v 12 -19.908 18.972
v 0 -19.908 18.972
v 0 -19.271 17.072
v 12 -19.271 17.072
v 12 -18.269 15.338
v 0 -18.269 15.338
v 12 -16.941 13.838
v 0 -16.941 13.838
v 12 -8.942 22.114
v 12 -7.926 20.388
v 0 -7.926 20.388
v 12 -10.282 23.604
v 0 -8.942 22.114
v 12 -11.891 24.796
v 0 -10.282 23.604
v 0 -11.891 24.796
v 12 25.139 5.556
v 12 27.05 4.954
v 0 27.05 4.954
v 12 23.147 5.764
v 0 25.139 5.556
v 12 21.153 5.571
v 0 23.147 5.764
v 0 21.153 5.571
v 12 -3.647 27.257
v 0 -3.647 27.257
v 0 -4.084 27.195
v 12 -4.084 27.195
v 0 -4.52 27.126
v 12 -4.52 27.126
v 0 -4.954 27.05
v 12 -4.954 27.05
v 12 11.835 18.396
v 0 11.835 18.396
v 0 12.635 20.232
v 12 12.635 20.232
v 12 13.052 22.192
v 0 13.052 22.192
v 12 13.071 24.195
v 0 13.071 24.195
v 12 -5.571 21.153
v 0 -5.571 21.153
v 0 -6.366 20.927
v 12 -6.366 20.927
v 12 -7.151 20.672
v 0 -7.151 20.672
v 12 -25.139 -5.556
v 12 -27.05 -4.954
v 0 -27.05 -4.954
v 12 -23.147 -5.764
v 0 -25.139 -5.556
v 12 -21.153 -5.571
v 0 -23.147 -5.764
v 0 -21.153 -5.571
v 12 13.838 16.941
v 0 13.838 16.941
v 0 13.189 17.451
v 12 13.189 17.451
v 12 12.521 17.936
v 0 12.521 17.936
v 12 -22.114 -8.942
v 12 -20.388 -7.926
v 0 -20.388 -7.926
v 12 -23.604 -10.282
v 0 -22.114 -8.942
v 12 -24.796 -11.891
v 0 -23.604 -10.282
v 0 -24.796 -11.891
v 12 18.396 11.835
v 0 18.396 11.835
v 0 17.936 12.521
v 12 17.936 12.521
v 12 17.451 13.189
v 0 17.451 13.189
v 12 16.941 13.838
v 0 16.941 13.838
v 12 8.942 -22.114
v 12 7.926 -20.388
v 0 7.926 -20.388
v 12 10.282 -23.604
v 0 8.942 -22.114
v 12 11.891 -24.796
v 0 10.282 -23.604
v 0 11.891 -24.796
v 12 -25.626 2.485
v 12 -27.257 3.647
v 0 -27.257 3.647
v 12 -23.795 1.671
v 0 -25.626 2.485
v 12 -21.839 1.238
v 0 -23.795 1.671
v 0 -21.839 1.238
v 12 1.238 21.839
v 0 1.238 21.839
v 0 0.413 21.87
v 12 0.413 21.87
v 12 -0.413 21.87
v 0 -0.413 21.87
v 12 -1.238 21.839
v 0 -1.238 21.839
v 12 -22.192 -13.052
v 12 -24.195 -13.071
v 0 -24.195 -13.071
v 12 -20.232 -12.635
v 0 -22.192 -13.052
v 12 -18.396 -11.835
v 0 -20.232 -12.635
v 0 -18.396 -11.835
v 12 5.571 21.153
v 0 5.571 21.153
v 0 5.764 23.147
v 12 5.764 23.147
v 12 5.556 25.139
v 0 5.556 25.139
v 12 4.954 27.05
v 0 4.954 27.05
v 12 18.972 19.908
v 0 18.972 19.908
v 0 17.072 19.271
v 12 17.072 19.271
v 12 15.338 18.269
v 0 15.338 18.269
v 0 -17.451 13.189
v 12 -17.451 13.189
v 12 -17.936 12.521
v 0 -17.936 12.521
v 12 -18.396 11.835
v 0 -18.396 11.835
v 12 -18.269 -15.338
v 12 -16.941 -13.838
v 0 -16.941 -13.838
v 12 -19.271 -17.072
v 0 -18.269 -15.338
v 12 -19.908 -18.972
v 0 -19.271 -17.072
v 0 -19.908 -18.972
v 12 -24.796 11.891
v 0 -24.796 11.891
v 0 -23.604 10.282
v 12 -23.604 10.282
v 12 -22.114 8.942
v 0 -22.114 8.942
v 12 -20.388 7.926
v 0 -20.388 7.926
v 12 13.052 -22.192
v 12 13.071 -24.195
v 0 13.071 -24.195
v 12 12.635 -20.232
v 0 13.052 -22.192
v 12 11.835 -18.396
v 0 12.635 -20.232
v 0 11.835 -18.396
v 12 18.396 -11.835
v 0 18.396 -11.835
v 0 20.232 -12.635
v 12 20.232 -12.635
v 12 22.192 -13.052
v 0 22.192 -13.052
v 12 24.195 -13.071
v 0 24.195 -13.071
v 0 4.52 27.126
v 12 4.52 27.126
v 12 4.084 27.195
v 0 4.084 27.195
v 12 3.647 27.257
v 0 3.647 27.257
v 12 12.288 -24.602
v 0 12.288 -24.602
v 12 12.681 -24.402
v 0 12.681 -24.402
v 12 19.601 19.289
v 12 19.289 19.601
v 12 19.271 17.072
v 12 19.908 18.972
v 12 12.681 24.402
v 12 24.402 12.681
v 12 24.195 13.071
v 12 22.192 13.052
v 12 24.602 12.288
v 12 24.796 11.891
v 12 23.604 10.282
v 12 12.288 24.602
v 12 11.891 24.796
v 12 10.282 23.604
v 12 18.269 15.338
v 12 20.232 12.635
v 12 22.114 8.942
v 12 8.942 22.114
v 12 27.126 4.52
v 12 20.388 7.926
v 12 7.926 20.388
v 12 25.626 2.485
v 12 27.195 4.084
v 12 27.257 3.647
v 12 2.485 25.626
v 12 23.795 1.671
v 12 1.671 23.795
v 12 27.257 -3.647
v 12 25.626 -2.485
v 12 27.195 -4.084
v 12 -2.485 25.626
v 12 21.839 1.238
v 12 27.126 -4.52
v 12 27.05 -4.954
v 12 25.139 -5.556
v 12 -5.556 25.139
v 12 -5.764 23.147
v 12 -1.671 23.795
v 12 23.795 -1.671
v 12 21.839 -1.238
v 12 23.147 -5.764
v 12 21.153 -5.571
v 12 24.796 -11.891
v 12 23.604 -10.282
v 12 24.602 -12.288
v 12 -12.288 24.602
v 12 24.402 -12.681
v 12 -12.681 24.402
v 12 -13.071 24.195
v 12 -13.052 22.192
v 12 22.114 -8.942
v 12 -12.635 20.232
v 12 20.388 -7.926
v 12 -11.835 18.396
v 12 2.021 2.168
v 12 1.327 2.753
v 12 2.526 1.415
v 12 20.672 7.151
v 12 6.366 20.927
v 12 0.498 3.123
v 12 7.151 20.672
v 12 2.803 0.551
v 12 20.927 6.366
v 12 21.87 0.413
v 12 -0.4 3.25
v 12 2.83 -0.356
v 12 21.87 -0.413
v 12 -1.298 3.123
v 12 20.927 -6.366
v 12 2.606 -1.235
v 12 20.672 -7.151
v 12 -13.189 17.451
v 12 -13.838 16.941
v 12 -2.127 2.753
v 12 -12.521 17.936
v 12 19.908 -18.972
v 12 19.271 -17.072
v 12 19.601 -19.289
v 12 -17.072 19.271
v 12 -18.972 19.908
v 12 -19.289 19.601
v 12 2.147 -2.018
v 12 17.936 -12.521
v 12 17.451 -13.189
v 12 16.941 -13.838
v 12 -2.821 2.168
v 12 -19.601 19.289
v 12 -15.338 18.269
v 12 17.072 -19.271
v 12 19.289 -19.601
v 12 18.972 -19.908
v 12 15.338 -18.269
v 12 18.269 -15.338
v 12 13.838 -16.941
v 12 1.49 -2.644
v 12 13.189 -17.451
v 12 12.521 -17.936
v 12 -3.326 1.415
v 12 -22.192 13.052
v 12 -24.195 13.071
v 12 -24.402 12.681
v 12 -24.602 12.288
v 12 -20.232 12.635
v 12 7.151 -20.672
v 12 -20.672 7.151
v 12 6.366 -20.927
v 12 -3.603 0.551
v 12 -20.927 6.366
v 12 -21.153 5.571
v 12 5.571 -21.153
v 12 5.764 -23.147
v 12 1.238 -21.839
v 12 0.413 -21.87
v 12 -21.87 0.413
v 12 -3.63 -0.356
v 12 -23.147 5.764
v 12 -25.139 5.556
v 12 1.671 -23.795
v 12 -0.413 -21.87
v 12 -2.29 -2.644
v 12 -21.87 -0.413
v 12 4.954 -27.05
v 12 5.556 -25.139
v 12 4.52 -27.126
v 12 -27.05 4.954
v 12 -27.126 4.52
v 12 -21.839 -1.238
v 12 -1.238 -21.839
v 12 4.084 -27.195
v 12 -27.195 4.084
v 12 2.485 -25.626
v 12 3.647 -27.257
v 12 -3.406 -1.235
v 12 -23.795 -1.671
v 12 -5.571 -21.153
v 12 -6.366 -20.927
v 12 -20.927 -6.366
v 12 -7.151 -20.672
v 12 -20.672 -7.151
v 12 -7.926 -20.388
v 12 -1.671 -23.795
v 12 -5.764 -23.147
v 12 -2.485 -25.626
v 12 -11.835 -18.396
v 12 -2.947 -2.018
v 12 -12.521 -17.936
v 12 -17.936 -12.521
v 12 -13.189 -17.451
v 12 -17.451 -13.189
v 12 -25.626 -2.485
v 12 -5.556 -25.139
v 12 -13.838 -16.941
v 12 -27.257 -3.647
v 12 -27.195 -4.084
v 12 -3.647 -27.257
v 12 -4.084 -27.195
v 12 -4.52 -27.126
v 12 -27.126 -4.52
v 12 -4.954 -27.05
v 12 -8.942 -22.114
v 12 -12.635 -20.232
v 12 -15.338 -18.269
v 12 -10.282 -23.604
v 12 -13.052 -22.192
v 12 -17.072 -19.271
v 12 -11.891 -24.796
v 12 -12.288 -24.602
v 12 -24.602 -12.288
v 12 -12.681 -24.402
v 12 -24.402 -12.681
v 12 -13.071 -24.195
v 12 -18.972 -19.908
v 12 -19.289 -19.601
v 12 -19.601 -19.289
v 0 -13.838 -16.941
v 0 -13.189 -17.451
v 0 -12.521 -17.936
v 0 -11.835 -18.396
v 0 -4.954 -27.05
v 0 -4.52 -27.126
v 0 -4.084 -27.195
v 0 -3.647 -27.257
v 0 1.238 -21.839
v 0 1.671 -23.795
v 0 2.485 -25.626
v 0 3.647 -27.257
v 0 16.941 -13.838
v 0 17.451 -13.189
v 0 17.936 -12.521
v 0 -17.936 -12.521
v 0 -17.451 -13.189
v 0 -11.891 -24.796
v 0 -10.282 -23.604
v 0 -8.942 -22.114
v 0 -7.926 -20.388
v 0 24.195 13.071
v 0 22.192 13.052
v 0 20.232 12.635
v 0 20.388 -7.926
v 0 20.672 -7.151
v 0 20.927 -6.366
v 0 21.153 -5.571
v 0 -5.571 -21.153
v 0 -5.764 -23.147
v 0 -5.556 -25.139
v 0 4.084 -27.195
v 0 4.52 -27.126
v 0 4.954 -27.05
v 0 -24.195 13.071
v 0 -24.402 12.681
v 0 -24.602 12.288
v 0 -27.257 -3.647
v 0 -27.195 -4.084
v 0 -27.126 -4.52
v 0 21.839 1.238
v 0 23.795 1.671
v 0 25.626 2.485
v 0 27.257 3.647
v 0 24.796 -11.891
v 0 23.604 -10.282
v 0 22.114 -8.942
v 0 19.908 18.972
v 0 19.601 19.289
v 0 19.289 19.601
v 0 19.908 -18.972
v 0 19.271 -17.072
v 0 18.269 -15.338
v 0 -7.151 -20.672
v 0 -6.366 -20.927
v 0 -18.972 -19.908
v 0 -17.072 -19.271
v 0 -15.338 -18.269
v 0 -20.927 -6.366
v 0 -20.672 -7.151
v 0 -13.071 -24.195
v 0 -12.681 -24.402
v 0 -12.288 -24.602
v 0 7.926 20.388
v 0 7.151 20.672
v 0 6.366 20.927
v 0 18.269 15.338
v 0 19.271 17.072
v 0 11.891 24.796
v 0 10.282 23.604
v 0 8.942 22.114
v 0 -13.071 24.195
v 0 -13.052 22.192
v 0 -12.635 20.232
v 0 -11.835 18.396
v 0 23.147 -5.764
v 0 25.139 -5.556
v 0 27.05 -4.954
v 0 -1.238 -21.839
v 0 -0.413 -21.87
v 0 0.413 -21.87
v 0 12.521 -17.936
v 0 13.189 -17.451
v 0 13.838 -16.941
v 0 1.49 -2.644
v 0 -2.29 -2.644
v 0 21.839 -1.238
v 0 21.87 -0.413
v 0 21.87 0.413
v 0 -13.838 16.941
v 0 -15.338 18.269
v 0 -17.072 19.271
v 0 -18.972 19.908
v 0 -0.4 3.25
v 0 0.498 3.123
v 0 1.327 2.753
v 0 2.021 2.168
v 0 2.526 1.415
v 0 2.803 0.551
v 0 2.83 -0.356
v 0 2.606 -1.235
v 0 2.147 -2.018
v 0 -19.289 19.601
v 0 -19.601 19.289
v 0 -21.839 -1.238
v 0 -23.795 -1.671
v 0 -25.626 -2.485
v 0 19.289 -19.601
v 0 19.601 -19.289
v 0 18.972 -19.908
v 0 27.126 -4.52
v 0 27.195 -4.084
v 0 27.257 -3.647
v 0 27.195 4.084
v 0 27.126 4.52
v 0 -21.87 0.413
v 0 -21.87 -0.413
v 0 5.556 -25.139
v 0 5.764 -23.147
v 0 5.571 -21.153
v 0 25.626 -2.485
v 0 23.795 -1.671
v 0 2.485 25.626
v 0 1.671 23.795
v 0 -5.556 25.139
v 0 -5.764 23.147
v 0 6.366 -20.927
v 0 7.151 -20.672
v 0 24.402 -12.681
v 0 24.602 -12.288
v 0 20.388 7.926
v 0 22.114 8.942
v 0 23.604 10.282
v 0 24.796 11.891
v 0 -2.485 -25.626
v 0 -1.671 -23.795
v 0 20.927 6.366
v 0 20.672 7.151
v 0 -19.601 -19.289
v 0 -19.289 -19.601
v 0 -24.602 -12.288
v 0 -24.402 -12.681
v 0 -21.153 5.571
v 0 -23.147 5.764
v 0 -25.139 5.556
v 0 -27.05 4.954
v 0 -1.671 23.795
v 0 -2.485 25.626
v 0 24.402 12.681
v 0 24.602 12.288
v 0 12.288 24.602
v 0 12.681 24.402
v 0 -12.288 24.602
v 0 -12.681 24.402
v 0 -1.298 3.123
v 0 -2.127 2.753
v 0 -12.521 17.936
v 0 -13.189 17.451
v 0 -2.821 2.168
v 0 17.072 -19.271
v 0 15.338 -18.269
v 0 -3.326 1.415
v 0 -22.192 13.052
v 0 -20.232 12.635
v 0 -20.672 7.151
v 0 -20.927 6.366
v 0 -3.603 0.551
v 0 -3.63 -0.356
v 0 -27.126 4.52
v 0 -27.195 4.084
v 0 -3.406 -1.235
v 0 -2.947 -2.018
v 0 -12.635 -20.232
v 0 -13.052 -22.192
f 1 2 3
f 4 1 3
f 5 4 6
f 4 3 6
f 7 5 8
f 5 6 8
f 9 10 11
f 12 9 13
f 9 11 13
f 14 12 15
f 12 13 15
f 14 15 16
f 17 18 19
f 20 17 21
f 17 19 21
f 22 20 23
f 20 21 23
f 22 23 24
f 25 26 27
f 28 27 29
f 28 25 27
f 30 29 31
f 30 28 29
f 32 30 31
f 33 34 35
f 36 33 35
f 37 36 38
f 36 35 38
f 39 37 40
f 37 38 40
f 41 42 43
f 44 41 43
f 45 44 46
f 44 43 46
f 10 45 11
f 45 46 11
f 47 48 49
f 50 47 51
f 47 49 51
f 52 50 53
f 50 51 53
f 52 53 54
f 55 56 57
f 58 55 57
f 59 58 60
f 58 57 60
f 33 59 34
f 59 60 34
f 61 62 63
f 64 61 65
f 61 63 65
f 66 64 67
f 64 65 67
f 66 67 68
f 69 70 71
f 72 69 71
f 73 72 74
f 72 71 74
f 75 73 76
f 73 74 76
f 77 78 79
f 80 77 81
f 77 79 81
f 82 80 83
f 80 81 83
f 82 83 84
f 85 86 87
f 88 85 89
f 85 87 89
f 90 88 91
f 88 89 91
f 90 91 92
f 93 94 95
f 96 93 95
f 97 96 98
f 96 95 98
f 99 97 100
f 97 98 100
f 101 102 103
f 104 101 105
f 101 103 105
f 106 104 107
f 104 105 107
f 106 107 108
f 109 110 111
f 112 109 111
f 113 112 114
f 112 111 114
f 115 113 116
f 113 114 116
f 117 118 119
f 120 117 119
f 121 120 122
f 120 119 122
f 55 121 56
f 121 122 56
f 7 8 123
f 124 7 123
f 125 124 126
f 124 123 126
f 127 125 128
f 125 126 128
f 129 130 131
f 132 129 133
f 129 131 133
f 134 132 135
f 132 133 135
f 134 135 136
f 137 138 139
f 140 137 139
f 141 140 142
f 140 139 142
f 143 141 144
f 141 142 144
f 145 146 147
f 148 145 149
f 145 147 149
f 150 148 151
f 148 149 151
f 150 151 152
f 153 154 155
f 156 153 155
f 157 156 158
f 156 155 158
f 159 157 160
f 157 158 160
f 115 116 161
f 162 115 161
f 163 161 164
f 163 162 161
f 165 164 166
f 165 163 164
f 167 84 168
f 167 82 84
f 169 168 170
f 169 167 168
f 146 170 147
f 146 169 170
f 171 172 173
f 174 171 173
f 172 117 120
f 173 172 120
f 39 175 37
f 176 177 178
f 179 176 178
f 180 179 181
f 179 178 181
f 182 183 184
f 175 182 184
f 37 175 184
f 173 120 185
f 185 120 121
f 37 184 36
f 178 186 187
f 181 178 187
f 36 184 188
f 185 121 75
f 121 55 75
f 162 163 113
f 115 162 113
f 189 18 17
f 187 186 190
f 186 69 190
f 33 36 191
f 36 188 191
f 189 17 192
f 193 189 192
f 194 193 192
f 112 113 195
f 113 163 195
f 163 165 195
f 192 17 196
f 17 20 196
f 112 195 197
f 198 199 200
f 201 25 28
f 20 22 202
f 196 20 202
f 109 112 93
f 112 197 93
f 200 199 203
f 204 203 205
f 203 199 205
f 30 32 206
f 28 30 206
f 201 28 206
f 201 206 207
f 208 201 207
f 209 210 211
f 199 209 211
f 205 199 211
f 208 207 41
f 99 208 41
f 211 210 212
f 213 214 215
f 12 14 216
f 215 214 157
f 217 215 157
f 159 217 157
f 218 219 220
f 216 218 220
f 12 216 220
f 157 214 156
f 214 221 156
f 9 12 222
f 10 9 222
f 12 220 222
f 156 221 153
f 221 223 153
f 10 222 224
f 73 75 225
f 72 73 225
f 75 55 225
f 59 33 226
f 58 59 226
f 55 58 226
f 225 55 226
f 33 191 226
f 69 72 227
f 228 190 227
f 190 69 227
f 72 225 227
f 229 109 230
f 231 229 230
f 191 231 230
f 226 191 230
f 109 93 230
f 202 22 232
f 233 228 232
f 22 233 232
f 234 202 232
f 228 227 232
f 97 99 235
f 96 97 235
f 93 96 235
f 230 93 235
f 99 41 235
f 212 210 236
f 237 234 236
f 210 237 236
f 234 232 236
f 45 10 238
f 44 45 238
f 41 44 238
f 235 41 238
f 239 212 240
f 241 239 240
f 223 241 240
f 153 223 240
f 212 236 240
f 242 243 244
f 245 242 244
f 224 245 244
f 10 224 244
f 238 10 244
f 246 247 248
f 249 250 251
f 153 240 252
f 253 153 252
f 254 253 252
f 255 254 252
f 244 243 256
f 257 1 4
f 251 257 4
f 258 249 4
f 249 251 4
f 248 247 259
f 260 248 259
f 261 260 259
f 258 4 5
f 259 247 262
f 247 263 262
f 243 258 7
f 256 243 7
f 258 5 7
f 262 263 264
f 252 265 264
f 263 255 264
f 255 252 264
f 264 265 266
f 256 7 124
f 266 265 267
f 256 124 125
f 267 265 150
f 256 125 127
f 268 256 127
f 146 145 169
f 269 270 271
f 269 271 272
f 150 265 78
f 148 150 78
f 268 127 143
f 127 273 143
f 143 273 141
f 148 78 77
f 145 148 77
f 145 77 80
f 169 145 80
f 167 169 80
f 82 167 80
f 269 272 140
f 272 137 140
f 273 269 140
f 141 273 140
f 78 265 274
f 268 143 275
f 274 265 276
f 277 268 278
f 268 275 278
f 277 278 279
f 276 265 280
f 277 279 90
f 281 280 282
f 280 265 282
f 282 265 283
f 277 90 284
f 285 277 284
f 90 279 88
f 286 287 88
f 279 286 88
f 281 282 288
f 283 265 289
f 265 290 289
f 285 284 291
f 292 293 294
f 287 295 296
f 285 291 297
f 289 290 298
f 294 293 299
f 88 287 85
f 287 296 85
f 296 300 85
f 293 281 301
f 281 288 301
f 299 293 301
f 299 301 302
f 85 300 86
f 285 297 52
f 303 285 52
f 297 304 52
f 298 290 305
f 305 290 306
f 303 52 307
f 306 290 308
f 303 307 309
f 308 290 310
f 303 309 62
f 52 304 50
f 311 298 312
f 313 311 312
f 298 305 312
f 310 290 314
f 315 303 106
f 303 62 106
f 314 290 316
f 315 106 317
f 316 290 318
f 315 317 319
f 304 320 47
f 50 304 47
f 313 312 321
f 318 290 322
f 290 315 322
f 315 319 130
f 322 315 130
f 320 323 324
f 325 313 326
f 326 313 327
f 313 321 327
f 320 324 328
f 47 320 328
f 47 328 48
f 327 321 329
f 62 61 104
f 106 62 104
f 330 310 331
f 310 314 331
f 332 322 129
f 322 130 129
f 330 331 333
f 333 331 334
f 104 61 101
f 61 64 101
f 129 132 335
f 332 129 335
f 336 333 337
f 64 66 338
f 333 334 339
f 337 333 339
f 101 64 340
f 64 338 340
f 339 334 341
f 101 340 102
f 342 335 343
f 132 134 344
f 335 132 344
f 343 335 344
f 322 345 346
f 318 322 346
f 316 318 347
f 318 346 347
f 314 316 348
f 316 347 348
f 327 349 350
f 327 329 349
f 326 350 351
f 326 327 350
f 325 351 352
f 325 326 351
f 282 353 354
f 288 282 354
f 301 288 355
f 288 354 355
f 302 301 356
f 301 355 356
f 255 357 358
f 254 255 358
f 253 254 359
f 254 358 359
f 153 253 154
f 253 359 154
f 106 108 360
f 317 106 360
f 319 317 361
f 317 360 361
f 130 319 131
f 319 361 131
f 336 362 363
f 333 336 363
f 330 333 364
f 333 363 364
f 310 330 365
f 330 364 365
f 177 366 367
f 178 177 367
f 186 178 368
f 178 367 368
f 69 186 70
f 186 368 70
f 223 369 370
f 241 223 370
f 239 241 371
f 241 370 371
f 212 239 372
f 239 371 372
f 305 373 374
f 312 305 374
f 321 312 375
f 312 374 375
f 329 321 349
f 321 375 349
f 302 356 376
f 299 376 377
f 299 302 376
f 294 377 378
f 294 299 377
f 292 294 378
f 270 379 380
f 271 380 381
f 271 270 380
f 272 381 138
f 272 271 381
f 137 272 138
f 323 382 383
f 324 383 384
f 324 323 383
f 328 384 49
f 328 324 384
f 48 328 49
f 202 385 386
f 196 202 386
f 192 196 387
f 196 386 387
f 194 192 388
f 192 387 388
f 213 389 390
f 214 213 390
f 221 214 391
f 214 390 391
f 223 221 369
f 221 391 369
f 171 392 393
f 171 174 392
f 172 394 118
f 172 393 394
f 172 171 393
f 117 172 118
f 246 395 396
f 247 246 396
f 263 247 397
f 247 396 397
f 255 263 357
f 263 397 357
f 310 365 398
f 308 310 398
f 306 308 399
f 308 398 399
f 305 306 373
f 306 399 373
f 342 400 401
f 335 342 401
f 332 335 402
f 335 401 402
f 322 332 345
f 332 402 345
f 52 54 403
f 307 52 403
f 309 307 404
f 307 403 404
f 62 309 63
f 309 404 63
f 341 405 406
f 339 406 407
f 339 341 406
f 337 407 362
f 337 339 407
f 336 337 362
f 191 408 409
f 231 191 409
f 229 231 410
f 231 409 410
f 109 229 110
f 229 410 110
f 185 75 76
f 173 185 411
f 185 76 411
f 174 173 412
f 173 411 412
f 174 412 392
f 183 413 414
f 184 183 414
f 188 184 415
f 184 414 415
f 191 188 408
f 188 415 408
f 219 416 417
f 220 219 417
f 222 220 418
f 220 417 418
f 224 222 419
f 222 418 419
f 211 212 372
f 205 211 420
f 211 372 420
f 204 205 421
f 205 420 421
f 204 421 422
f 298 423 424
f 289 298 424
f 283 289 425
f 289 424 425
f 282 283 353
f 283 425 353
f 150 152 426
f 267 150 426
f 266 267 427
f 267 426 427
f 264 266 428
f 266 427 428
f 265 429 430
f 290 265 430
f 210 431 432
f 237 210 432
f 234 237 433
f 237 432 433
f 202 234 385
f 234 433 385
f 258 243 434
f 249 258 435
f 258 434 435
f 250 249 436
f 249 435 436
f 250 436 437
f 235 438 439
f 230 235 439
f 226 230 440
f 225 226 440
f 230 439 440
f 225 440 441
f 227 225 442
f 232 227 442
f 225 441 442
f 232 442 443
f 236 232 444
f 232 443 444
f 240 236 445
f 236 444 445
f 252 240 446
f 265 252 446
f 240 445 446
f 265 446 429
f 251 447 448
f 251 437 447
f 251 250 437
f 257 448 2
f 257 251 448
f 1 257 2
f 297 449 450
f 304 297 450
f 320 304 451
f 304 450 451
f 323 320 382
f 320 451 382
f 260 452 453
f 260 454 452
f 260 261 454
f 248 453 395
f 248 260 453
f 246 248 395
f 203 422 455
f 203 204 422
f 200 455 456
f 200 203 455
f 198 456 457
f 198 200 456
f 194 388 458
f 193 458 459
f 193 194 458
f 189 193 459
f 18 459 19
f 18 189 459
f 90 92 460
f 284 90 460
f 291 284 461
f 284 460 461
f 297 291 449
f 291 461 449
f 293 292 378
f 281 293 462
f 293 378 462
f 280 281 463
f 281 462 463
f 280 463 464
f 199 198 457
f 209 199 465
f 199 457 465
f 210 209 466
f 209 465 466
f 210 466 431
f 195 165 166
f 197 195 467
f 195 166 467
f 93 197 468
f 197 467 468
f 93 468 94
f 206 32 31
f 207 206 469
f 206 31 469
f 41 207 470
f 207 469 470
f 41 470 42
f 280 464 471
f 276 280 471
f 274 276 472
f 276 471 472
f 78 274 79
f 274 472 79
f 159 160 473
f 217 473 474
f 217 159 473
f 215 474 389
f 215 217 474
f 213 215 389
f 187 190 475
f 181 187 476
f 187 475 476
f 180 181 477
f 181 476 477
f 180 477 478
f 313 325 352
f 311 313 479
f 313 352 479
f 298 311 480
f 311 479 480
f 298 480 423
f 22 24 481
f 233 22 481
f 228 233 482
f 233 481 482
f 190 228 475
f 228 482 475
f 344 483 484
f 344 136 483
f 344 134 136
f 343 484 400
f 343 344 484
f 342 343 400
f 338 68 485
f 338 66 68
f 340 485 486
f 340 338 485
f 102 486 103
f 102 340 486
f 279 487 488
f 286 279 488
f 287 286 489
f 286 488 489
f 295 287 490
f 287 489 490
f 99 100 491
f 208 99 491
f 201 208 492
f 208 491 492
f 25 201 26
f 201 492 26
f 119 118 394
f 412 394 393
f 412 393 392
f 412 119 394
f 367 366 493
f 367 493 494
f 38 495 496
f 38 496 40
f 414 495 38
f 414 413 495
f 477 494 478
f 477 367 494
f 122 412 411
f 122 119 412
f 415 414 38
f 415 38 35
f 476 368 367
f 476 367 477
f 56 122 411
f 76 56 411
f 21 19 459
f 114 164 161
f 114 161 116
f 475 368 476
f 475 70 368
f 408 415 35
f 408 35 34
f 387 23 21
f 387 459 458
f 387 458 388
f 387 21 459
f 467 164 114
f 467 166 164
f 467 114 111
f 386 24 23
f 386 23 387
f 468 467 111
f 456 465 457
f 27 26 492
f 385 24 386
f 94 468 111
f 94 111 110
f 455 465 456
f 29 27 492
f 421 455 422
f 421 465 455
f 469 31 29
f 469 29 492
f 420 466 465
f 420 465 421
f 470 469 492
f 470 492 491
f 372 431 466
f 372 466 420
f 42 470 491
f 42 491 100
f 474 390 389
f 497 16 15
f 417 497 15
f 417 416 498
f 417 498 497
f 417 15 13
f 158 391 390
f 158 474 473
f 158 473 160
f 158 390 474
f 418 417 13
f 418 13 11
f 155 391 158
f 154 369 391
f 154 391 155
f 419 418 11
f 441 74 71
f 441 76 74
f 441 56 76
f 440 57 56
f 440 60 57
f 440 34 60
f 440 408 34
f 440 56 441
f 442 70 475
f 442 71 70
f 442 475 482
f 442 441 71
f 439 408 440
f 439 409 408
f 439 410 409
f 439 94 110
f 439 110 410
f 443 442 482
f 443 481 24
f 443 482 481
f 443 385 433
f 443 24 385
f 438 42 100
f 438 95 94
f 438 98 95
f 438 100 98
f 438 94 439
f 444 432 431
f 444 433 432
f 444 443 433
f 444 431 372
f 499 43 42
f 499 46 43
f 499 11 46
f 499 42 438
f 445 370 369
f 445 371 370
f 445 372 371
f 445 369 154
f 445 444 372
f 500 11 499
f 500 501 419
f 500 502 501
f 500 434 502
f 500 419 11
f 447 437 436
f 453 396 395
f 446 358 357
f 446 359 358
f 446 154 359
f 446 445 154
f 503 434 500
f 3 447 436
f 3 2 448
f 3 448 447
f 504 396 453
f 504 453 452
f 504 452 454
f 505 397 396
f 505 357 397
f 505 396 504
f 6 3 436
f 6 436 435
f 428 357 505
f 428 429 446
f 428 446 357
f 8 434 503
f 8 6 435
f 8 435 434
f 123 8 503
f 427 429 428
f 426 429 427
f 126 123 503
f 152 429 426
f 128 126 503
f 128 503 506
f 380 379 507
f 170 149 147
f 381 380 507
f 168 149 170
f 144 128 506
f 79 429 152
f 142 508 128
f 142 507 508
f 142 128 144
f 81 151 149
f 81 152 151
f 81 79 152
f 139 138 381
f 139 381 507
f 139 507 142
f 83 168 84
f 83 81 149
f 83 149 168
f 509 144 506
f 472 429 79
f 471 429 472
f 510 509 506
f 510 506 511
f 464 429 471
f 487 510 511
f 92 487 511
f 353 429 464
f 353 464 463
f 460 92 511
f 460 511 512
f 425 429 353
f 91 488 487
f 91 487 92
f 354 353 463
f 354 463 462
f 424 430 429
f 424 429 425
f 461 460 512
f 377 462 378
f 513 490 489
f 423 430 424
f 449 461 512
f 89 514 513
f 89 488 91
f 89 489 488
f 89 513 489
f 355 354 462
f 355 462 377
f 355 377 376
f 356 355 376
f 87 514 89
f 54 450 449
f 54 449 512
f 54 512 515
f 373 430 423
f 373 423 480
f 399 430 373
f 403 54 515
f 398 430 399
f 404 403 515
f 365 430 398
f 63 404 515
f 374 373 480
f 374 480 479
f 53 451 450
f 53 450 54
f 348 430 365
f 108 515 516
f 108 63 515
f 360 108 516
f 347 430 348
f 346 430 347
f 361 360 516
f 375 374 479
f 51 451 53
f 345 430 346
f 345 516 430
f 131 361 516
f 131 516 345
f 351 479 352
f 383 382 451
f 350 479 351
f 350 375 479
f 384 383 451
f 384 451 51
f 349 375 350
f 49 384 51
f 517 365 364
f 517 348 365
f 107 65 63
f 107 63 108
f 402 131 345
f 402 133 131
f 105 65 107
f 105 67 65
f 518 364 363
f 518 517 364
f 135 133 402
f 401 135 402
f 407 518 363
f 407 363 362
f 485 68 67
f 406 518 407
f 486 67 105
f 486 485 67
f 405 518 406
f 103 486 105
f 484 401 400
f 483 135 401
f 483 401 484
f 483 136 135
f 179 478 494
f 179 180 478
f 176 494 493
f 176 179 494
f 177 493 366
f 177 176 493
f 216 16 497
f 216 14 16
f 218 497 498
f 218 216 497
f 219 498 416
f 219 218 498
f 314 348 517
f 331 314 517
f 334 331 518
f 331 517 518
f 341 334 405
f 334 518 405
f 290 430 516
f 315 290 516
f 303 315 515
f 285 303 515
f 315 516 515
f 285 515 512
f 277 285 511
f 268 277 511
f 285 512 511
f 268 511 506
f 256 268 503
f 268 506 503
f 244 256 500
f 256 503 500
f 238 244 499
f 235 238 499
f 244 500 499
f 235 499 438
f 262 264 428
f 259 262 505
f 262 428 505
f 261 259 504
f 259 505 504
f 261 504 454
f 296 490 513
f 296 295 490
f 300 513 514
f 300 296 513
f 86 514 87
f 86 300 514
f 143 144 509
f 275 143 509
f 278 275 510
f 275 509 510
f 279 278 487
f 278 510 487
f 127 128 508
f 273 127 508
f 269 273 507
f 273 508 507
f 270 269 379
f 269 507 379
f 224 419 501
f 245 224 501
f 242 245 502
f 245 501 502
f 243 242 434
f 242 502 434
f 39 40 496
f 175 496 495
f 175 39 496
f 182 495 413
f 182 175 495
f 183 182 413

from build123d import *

# Parameters (mm, degrees)
BASPROSKE_W           = 12
BASPROSKE_H           = 27.5
TOOTHCUT_DEPTH        = 41.70012285
TEETHCUTS_COUNT       = 20
TEETHCUTS_ANGLE       = 342
BORSKE_R              = 0.4
BORE_DEPTH            = 50.0000508
KES_EKSTR_ZYON1_DEPTH = 100


with BuildPart() as part:
    # BasProSke → Base-Revolve (revolve)
    with BuildSketch(Plane(origin=(0, 0, 0), x_dir=(1, 0, 0), z_dir=(0, 1, 0)), mode=Mode.PRIVATE) as base_revolve_sk:
        with Locations((6, 13.75)):
            Rectangle(BASPROSKE_W, BASPROSKE_H)
    revolve(base_revolve_sk.sketch.rotate(Axis((-10, 0, 0), (1, 0, 0)), 180), axis=Axis((-10, 0, 0), (1, 0, 0)))

    # TooCutSke → ToothCut (cut, through all)
    with BuildSketch(Plane(origin=(0, 0, 0), x_dir=(0, 0, -1), z_dir=(1, 0, 0))):
        with BuildLine():
            ThreePointArc((1.237725267, 21.838954008), (0, 21.874), (-1.237725267, 21.838954008))
            ThreePointArc((-1.237725267, 21.838954008), (-2.037783758, 24.744650423), (-3.667234079, 27.280011719))
            ThreePointArc((-3.667234079, 27.280011719), (0, 27.5254), (3.667234079, 27.280011719))
            ThreePointArc((3.667234079, 27.280011719), (2.037783758, 24.744650423), (1.237725267, 21.838954008))
        make_face()
    toothcut = extrude(amount=TOOTHCUT_DEPTH, mode=Mode.SUBTRACT)

    # TeethCuts: ToothCut ×20 about axis
    teethcuts_axis = Axis((-10, 0, 0), (1, 0, 0))
    for i in range(1, TEETHCUTS_COUNT):
        add(toothcut.rotate(teethcuts_axis, i * TEETHCUTS_ANGLE / (TEETHCUTS_COUNT - 1)), mode=Mode.SUBTRACT)

    # BorSke → Bore (cut, symmetric)
    with BuildSketch(Plane(origin=(0, 0, 0), x_dir=(0, 0, -1), z_dir=(1, 0, 0))):
        with Locations(Location((0, 0, 0), (0, 0, 180))):
            Circle(BORSKE_R)
    extrude(amount=BORE_DEPTH, both=True, mode=Mode.SUBTRACT)

    # Çizim1 → Kes-Ekstrüzyon1 (cut)
    with BuildSketch(Plane.ZY):
        with BuildLine():
            ThreePointArc((3.25, -0.4), (0.99239773, 2.694777334), (-2.643936459, 1.49))
            Line((-2.643936459, 1.49), (-2.643936459, -2.29))
            ThreePointArc((-2.643936459, -2.29), (0.99239773, -3.494777334), (3.25, -0.4))
        make_face()
    extrude(amount=-KES_EKSTR_ZYON1_DEPTH, mode=Mode.SUBTRACT)


solid = part.part
